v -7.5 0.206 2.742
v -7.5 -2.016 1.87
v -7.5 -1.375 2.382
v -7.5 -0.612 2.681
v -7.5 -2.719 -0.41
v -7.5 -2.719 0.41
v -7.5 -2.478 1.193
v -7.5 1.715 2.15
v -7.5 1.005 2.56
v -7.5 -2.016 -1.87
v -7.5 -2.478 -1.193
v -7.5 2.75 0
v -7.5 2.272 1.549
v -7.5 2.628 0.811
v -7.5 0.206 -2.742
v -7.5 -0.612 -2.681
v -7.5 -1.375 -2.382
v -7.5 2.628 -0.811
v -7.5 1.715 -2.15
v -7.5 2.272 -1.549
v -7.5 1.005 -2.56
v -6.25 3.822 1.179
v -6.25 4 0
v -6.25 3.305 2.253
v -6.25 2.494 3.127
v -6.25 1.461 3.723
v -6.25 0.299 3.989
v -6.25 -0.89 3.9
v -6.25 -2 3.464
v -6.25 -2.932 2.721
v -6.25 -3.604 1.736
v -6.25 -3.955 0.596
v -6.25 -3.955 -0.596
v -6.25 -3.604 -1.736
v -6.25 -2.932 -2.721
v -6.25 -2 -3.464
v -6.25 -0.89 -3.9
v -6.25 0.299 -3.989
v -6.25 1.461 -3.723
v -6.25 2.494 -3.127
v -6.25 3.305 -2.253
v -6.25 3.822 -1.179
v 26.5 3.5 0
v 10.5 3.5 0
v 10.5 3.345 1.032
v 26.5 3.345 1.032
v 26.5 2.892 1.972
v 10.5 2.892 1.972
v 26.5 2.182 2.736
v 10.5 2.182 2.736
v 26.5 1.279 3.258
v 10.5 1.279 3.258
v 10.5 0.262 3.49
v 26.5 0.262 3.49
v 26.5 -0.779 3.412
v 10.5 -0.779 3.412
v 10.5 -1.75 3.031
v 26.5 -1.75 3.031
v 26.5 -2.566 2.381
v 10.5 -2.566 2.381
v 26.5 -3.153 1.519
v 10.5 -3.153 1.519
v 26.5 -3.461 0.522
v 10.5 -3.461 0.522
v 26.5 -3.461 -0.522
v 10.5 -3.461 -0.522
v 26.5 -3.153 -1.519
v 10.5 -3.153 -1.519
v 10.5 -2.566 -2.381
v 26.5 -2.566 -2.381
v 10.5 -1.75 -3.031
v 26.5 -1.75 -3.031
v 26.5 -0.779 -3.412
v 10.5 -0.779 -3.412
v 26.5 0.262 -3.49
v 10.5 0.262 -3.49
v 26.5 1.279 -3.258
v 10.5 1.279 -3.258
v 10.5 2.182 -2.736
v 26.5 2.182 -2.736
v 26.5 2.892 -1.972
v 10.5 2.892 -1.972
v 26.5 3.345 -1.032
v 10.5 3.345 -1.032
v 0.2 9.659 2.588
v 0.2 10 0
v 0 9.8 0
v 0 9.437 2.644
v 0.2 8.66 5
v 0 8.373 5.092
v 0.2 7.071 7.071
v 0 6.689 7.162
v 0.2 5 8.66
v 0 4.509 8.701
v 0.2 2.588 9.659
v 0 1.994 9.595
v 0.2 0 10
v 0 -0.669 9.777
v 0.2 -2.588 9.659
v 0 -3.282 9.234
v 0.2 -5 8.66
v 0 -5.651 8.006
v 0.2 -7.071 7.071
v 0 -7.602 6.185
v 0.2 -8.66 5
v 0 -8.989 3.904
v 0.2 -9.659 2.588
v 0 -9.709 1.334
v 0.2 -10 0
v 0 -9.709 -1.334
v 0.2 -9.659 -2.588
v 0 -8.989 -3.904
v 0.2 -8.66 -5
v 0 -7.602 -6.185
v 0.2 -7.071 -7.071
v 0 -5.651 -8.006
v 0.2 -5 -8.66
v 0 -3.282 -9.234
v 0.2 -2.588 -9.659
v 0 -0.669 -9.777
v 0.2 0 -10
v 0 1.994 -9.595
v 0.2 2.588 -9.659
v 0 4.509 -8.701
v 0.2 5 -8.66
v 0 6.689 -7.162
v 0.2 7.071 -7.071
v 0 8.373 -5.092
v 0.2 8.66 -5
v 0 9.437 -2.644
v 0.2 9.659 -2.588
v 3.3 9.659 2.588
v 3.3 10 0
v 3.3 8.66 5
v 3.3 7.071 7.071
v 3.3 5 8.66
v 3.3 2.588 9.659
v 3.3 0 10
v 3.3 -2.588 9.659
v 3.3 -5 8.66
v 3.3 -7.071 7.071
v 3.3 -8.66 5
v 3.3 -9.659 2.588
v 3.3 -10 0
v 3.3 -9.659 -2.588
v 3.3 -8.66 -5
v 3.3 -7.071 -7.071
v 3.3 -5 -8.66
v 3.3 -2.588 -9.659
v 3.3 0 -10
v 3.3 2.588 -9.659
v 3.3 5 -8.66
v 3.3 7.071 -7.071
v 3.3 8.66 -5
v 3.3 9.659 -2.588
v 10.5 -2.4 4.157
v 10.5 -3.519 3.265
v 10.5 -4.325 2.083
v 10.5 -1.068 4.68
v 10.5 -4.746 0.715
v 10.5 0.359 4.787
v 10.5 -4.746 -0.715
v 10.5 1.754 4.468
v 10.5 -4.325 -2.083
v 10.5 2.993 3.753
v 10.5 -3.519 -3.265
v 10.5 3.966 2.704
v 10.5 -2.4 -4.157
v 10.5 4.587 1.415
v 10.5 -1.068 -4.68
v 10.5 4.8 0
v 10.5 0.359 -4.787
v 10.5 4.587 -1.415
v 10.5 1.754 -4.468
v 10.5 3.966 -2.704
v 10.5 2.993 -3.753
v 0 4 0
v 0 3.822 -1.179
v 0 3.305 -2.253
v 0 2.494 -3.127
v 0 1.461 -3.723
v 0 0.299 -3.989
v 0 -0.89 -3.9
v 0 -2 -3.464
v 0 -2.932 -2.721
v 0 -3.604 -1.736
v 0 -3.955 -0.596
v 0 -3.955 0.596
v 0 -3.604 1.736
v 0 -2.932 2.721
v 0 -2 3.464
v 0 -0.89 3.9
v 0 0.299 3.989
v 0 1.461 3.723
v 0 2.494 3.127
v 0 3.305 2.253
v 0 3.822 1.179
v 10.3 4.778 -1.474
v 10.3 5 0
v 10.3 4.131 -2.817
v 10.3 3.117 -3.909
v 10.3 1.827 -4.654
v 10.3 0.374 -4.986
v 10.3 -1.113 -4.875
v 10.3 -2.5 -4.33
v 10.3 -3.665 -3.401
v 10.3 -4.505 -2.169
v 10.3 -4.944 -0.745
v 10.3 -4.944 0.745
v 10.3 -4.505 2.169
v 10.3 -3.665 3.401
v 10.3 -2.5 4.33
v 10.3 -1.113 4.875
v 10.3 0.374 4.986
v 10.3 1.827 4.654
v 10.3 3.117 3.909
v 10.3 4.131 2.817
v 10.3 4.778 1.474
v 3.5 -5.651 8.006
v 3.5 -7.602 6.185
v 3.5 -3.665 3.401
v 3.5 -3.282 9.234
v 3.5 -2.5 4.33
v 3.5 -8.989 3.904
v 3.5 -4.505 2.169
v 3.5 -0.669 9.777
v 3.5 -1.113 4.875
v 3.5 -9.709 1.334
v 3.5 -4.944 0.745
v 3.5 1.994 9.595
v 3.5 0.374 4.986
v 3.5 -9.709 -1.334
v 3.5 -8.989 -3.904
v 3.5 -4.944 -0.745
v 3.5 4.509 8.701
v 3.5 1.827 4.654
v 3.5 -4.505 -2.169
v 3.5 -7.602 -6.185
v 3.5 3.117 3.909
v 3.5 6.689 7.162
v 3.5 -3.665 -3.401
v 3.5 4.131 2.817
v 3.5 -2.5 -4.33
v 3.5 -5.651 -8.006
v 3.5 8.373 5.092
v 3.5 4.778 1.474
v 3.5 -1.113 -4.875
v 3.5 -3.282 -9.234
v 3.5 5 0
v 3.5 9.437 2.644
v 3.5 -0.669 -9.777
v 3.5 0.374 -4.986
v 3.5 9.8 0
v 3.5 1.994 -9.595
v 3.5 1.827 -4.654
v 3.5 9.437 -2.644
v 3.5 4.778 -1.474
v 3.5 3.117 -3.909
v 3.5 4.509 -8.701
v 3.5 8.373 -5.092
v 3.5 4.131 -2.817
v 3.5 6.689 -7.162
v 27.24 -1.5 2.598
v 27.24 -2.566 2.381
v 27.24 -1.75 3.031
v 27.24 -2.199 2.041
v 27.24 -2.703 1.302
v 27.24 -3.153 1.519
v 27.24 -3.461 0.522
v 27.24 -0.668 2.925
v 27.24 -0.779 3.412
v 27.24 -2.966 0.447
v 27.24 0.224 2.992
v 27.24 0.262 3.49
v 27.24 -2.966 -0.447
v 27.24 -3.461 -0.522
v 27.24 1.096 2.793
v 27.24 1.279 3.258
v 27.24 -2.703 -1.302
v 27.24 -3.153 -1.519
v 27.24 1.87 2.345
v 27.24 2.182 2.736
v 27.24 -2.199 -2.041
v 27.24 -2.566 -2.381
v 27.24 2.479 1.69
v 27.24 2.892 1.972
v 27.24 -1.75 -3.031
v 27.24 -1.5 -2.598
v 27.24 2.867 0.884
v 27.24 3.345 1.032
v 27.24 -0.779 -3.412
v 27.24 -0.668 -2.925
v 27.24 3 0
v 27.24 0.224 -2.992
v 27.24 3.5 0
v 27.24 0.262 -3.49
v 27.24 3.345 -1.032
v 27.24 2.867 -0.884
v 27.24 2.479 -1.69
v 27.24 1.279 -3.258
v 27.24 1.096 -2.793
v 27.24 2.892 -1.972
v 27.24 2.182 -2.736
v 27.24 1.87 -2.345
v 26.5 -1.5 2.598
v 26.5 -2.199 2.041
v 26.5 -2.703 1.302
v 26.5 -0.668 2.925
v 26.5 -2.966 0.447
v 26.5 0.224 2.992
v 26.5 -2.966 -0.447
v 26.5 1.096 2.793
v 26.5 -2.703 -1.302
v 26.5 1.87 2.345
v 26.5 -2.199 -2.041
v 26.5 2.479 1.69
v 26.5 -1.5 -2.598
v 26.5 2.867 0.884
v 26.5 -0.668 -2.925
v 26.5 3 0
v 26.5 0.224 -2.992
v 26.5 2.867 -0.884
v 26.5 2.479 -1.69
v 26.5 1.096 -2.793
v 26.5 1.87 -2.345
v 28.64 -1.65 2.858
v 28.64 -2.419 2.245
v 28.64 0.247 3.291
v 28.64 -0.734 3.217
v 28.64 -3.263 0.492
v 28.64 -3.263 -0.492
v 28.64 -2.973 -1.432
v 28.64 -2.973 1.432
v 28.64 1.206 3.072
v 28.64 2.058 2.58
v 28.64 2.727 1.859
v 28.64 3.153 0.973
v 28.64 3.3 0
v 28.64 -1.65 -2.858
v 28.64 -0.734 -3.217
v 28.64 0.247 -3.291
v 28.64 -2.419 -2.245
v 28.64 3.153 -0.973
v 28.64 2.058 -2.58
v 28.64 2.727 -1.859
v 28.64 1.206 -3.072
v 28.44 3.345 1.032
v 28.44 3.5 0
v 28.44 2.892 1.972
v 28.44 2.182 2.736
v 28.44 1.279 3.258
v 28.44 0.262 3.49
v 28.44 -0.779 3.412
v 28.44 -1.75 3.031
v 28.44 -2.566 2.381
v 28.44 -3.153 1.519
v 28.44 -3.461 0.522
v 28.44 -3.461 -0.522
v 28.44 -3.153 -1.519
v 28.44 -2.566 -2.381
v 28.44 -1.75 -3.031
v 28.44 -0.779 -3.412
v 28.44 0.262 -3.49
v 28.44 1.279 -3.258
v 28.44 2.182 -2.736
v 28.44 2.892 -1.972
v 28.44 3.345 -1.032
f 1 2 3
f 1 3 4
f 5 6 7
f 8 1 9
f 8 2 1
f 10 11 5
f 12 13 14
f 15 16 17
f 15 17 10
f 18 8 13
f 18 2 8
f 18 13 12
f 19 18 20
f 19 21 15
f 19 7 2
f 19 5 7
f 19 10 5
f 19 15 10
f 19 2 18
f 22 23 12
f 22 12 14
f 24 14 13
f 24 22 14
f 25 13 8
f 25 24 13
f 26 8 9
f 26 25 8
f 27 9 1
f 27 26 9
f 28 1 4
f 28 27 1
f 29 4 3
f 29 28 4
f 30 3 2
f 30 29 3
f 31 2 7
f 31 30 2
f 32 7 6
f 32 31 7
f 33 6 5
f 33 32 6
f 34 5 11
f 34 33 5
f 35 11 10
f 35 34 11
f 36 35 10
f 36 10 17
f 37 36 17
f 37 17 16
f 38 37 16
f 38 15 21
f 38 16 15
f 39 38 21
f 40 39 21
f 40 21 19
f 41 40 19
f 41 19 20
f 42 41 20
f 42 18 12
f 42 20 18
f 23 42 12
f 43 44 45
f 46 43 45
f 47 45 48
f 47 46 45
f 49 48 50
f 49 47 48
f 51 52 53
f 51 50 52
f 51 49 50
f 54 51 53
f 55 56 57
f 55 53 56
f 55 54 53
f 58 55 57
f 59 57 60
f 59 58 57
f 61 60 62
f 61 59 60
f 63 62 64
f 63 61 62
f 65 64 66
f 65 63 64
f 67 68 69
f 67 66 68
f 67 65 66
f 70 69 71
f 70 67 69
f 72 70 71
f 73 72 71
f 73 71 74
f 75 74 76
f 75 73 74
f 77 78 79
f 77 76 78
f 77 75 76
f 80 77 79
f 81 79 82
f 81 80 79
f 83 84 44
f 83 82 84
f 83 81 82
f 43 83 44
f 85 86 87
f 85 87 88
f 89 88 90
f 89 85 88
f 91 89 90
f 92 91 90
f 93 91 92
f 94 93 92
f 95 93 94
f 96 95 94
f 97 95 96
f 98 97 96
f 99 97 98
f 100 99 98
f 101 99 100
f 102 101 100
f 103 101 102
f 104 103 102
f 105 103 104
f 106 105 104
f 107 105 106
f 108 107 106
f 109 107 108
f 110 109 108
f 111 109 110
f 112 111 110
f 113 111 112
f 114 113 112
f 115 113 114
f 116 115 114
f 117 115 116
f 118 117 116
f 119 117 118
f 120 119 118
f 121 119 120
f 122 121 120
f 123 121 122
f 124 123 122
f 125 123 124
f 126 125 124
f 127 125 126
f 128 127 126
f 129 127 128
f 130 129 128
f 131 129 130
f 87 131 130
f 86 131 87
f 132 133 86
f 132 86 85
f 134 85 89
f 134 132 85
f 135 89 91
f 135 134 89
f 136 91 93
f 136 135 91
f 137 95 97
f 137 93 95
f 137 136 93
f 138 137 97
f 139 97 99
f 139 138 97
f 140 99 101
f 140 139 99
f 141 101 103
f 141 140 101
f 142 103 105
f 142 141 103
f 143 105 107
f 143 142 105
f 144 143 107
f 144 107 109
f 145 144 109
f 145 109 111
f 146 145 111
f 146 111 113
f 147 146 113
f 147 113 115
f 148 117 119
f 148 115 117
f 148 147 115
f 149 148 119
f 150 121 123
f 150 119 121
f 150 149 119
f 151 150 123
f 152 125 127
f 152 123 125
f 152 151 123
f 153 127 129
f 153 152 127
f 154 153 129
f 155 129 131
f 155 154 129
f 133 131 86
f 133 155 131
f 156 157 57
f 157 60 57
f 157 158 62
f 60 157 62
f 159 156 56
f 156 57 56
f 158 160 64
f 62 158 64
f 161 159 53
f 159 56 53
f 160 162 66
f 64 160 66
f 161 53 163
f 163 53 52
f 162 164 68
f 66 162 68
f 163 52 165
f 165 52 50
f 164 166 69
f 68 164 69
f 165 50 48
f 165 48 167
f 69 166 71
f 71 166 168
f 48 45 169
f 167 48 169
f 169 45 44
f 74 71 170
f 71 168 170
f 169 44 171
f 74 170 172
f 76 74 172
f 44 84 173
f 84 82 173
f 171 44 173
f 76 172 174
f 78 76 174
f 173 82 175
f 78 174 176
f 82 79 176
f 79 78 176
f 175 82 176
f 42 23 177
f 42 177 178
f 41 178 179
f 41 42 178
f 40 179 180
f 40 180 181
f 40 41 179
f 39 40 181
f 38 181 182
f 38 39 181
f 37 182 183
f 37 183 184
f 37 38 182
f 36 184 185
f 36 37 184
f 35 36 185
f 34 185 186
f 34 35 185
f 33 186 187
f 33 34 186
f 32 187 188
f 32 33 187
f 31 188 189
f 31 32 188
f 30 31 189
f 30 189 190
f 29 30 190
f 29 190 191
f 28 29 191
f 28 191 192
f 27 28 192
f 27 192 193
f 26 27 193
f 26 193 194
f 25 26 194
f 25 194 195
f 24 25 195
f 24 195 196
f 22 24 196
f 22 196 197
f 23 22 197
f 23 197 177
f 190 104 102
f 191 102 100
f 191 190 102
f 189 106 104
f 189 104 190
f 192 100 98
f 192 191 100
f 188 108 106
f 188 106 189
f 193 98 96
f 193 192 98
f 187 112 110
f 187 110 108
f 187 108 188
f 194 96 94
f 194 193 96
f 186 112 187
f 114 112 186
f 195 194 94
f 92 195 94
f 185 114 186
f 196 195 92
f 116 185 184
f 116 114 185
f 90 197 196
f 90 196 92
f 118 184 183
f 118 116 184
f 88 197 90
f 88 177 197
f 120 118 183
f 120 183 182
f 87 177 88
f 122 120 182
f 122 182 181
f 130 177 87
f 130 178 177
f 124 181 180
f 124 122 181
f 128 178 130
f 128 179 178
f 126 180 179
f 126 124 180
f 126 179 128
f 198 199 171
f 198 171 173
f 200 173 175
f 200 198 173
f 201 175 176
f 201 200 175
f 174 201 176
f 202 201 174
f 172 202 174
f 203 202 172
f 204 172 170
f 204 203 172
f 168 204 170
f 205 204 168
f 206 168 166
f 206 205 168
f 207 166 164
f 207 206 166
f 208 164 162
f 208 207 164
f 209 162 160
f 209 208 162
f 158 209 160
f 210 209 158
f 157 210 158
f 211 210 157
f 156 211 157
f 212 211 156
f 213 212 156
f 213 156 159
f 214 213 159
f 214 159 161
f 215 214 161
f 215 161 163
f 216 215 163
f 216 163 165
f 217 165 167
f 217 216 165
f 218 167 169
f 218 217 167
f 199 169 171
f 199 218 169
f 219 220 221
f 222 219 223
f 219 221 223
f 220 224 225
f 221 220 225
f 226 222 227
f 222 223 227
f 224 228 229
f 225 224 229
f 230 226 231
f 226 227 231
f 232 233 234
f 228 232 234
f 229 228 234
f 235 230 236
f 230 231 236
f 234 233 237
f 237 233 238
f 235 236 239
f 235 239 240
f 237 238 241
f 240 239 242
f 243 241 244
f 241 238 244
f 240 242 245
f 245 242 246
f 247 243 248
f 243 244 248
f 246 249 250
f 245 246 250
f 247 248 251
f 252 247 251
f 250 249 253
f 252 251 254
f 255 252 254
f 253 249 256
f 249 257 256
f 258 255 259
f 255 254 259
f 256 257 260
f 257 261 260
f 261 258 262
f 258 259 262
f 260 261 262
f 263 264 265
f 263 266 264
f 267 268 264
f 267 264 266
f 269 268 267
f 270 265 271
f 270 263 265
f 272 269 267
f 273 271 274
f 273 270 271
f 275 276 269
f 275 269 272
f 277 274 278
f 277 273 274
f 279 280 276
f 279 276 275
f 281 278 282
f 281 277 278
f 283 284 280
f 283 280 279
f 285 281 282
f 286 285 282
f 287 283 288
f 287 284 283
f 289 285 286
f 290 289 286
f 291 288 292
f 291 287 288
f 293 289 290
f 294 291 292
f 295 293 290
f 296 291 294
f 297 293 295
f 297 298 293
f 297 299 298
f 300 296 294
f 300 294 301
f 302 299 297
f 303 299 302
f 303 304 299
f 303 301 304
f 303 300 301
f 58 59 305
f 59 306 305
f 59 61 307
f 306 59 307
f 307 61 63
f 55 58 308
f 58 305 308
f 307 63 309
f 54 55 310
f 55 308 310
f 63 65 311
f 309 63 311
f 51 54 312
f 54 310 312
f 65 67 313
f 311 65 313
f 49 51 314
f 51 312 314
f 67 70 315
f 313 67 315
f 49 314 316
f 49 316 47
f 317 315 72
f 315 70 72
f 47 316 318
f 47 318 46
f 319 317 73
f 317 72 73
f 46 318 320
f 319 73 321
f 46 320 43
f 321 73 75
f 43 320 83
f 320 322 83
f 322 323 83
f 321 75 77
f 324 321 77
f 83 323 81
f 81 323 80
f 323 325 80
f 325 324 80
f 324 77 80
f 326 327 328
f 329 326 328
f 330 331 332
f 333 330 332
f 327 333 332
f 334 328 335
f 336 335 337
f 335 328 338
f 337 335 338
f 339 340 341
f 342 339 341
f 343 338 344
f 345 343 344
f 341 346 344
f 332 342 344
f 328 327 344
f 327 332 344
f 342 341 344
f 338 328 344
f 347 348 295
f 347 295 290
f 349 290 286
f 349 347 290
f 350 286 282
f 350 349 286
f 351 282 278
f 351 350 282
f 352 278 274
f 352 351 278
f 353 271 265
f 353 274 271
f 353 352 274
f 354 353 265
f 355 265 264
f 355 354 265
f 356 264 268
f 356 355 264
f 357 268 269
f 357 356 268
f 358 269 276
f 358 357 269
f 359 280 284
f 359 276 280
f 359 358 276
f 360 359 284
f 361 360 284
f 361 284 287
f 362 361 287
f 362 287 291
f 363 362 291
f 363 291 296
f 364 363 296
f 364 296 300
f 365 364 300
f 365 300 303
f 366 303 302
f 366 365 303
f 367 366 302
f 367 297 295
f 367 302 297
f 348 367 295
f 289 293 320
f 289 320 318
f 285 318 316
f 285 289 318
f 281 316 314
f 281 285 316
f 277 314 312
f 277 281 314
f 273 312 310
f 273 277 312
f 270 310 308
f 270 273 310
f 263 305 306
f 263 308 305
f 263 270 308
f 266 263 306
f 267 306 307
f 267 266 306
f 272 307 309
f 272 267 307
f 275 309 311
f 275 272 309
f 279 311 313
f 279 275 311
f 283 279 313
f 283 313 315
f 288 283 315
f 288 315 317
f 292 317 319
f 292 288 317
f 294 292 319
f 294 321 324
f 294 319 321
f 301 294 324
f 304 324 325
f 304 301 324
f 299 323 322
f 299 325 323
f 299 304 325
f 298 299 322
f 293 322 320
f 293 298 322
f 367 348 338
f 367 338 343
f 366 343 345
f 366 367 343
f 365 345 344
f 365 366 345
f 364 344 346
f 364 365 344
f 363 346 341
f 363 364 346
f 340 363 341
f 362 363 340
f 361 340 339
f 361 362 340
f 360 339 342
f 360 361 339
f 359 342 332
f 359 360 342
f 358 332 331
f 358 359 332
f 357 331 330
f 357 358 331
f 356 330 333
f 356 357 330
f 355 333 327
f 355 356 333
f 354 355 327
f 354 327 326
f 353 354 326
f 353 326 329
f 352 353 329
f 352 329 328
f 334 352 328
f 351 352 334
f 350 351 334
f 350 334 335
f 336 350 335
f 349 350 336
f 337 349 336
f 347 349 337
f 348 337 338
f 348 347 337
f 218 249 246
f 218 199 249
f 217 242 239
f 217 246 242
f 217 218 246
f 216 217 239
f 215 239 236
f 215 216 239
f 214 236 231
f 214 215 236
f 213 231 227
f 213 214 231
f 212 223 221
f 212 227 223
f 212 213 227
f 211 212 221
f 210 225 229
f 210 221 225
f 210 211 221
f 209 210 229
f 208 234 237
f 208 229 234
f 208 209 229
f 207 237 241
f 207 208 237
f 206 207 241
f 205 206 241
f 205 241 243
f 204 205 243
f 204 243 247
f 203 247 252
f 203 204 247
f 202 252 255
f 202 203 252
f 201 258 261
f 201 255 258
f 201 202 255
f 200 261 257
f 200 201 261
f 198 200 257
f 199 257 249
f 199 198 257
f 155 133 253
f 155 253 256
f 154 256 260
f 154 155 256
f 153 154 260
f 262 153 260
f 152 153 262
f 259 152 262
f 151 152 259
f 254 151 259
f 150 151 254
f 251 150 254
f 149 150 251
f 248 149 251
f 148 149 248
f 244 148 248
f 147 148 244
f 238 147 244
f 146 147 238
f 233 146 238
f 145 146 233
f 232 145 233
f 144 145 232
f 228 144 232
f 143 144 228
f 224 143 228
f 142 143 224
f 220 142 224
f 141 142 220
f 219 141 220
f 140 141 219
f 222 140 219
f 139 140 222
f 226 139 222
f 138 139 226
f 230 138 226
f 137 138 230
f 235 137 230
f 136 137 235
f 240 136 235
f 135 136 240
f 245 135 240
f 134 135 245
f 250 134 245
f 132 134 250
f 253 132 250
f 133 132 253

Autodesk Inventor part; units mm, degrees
ref_plane "YZ Plane" through (0, 0, 0) normal (1, 0, 0) x (0, 1, 0)
ref_plane "XZ Plane" through (0, 0, 0) normal (0, 1, 0) x (-1, 0, 0)
ref_plane "XY Plane" through (0, 0, 0) normal (0, 0, 1) x (1, 0, 0)
sketch "Skizze1" plane through (0, 0, 0) normal (0, 0, 1) x (1, 0, 0)
  line L0 (0, 0) -> (0, 10)
  line L1 (0, 10) -> (3.5, 10)
  line L2 (3.5, 10) -> (3.5, 5)
  line L3 (10.5, 3.5) -> (26.5, 3.5)
  line L4 (26.5, 3.5) -> (26.5, 3)
  line L5 (26.5, 3) -> (27.24, 3)
  line L6 (27.24, 3) -> (27.24, 3.5)
  line L7 (27.24, 3.5) -> (28.44, 3.5)
  line L8 (28.64, 3.3) -> (28.64, 0)
  line L9 (28.64, 0) -> (0, 0)
  line L10 (28.44, 3.5) -> (28.64, 3.3)
  line L11 (3.5, 5) -> (10.5, 5)
  line L12 (10.5, 5) -> (10.5, 3.5)
  line L13 (0, 4) -> (-7.5, 4)
  line L14 (-7.5, 4) -> (-7.5, 0)
  line L15 (-7.5, 0) -> (0, 0)
  point P0 (28.64, 3.5)
  dimension "d0" = 6
  dimension "d1" = 7
  dimension "d2" = 0.74
  dimension "d3" = 0.2
  dimension "d4" = 0.2
  dimension "d5" = 1.2
  dimension "d6" = 10
  dimension "d7" = 23
  dimension "d8" = 16
  dimension "d9" = 20
  dimension "Gabel_FixationShaft_Contact_Thickness" = 3.5
  dimension "d29" = 8
  dimension "d30" = 7.5
revolve "Umdrehung1" add sketch "Skizze1" angle 360 about axis through (28.64, 0, 0) along (-1, 0, 0)
chamfer "Fase1" distance 0.2 angle 45 3 edges at (10.5, -5, 0) (3.5, -10, 0) (0, -10, 0)
chamfer "Fase2" distance 1.25 angle 45 1 edges at (-7.5, -4, 0)
thread "Gewinde1" size "M8x1.25" class "6g" standard "ANSI Metric M Profile" full length
equation "\"d3\" = d4"
properties part number "ParallelMecha_Gabel_Connection_JointShaft_Nadellager" material "Edelstahl"
